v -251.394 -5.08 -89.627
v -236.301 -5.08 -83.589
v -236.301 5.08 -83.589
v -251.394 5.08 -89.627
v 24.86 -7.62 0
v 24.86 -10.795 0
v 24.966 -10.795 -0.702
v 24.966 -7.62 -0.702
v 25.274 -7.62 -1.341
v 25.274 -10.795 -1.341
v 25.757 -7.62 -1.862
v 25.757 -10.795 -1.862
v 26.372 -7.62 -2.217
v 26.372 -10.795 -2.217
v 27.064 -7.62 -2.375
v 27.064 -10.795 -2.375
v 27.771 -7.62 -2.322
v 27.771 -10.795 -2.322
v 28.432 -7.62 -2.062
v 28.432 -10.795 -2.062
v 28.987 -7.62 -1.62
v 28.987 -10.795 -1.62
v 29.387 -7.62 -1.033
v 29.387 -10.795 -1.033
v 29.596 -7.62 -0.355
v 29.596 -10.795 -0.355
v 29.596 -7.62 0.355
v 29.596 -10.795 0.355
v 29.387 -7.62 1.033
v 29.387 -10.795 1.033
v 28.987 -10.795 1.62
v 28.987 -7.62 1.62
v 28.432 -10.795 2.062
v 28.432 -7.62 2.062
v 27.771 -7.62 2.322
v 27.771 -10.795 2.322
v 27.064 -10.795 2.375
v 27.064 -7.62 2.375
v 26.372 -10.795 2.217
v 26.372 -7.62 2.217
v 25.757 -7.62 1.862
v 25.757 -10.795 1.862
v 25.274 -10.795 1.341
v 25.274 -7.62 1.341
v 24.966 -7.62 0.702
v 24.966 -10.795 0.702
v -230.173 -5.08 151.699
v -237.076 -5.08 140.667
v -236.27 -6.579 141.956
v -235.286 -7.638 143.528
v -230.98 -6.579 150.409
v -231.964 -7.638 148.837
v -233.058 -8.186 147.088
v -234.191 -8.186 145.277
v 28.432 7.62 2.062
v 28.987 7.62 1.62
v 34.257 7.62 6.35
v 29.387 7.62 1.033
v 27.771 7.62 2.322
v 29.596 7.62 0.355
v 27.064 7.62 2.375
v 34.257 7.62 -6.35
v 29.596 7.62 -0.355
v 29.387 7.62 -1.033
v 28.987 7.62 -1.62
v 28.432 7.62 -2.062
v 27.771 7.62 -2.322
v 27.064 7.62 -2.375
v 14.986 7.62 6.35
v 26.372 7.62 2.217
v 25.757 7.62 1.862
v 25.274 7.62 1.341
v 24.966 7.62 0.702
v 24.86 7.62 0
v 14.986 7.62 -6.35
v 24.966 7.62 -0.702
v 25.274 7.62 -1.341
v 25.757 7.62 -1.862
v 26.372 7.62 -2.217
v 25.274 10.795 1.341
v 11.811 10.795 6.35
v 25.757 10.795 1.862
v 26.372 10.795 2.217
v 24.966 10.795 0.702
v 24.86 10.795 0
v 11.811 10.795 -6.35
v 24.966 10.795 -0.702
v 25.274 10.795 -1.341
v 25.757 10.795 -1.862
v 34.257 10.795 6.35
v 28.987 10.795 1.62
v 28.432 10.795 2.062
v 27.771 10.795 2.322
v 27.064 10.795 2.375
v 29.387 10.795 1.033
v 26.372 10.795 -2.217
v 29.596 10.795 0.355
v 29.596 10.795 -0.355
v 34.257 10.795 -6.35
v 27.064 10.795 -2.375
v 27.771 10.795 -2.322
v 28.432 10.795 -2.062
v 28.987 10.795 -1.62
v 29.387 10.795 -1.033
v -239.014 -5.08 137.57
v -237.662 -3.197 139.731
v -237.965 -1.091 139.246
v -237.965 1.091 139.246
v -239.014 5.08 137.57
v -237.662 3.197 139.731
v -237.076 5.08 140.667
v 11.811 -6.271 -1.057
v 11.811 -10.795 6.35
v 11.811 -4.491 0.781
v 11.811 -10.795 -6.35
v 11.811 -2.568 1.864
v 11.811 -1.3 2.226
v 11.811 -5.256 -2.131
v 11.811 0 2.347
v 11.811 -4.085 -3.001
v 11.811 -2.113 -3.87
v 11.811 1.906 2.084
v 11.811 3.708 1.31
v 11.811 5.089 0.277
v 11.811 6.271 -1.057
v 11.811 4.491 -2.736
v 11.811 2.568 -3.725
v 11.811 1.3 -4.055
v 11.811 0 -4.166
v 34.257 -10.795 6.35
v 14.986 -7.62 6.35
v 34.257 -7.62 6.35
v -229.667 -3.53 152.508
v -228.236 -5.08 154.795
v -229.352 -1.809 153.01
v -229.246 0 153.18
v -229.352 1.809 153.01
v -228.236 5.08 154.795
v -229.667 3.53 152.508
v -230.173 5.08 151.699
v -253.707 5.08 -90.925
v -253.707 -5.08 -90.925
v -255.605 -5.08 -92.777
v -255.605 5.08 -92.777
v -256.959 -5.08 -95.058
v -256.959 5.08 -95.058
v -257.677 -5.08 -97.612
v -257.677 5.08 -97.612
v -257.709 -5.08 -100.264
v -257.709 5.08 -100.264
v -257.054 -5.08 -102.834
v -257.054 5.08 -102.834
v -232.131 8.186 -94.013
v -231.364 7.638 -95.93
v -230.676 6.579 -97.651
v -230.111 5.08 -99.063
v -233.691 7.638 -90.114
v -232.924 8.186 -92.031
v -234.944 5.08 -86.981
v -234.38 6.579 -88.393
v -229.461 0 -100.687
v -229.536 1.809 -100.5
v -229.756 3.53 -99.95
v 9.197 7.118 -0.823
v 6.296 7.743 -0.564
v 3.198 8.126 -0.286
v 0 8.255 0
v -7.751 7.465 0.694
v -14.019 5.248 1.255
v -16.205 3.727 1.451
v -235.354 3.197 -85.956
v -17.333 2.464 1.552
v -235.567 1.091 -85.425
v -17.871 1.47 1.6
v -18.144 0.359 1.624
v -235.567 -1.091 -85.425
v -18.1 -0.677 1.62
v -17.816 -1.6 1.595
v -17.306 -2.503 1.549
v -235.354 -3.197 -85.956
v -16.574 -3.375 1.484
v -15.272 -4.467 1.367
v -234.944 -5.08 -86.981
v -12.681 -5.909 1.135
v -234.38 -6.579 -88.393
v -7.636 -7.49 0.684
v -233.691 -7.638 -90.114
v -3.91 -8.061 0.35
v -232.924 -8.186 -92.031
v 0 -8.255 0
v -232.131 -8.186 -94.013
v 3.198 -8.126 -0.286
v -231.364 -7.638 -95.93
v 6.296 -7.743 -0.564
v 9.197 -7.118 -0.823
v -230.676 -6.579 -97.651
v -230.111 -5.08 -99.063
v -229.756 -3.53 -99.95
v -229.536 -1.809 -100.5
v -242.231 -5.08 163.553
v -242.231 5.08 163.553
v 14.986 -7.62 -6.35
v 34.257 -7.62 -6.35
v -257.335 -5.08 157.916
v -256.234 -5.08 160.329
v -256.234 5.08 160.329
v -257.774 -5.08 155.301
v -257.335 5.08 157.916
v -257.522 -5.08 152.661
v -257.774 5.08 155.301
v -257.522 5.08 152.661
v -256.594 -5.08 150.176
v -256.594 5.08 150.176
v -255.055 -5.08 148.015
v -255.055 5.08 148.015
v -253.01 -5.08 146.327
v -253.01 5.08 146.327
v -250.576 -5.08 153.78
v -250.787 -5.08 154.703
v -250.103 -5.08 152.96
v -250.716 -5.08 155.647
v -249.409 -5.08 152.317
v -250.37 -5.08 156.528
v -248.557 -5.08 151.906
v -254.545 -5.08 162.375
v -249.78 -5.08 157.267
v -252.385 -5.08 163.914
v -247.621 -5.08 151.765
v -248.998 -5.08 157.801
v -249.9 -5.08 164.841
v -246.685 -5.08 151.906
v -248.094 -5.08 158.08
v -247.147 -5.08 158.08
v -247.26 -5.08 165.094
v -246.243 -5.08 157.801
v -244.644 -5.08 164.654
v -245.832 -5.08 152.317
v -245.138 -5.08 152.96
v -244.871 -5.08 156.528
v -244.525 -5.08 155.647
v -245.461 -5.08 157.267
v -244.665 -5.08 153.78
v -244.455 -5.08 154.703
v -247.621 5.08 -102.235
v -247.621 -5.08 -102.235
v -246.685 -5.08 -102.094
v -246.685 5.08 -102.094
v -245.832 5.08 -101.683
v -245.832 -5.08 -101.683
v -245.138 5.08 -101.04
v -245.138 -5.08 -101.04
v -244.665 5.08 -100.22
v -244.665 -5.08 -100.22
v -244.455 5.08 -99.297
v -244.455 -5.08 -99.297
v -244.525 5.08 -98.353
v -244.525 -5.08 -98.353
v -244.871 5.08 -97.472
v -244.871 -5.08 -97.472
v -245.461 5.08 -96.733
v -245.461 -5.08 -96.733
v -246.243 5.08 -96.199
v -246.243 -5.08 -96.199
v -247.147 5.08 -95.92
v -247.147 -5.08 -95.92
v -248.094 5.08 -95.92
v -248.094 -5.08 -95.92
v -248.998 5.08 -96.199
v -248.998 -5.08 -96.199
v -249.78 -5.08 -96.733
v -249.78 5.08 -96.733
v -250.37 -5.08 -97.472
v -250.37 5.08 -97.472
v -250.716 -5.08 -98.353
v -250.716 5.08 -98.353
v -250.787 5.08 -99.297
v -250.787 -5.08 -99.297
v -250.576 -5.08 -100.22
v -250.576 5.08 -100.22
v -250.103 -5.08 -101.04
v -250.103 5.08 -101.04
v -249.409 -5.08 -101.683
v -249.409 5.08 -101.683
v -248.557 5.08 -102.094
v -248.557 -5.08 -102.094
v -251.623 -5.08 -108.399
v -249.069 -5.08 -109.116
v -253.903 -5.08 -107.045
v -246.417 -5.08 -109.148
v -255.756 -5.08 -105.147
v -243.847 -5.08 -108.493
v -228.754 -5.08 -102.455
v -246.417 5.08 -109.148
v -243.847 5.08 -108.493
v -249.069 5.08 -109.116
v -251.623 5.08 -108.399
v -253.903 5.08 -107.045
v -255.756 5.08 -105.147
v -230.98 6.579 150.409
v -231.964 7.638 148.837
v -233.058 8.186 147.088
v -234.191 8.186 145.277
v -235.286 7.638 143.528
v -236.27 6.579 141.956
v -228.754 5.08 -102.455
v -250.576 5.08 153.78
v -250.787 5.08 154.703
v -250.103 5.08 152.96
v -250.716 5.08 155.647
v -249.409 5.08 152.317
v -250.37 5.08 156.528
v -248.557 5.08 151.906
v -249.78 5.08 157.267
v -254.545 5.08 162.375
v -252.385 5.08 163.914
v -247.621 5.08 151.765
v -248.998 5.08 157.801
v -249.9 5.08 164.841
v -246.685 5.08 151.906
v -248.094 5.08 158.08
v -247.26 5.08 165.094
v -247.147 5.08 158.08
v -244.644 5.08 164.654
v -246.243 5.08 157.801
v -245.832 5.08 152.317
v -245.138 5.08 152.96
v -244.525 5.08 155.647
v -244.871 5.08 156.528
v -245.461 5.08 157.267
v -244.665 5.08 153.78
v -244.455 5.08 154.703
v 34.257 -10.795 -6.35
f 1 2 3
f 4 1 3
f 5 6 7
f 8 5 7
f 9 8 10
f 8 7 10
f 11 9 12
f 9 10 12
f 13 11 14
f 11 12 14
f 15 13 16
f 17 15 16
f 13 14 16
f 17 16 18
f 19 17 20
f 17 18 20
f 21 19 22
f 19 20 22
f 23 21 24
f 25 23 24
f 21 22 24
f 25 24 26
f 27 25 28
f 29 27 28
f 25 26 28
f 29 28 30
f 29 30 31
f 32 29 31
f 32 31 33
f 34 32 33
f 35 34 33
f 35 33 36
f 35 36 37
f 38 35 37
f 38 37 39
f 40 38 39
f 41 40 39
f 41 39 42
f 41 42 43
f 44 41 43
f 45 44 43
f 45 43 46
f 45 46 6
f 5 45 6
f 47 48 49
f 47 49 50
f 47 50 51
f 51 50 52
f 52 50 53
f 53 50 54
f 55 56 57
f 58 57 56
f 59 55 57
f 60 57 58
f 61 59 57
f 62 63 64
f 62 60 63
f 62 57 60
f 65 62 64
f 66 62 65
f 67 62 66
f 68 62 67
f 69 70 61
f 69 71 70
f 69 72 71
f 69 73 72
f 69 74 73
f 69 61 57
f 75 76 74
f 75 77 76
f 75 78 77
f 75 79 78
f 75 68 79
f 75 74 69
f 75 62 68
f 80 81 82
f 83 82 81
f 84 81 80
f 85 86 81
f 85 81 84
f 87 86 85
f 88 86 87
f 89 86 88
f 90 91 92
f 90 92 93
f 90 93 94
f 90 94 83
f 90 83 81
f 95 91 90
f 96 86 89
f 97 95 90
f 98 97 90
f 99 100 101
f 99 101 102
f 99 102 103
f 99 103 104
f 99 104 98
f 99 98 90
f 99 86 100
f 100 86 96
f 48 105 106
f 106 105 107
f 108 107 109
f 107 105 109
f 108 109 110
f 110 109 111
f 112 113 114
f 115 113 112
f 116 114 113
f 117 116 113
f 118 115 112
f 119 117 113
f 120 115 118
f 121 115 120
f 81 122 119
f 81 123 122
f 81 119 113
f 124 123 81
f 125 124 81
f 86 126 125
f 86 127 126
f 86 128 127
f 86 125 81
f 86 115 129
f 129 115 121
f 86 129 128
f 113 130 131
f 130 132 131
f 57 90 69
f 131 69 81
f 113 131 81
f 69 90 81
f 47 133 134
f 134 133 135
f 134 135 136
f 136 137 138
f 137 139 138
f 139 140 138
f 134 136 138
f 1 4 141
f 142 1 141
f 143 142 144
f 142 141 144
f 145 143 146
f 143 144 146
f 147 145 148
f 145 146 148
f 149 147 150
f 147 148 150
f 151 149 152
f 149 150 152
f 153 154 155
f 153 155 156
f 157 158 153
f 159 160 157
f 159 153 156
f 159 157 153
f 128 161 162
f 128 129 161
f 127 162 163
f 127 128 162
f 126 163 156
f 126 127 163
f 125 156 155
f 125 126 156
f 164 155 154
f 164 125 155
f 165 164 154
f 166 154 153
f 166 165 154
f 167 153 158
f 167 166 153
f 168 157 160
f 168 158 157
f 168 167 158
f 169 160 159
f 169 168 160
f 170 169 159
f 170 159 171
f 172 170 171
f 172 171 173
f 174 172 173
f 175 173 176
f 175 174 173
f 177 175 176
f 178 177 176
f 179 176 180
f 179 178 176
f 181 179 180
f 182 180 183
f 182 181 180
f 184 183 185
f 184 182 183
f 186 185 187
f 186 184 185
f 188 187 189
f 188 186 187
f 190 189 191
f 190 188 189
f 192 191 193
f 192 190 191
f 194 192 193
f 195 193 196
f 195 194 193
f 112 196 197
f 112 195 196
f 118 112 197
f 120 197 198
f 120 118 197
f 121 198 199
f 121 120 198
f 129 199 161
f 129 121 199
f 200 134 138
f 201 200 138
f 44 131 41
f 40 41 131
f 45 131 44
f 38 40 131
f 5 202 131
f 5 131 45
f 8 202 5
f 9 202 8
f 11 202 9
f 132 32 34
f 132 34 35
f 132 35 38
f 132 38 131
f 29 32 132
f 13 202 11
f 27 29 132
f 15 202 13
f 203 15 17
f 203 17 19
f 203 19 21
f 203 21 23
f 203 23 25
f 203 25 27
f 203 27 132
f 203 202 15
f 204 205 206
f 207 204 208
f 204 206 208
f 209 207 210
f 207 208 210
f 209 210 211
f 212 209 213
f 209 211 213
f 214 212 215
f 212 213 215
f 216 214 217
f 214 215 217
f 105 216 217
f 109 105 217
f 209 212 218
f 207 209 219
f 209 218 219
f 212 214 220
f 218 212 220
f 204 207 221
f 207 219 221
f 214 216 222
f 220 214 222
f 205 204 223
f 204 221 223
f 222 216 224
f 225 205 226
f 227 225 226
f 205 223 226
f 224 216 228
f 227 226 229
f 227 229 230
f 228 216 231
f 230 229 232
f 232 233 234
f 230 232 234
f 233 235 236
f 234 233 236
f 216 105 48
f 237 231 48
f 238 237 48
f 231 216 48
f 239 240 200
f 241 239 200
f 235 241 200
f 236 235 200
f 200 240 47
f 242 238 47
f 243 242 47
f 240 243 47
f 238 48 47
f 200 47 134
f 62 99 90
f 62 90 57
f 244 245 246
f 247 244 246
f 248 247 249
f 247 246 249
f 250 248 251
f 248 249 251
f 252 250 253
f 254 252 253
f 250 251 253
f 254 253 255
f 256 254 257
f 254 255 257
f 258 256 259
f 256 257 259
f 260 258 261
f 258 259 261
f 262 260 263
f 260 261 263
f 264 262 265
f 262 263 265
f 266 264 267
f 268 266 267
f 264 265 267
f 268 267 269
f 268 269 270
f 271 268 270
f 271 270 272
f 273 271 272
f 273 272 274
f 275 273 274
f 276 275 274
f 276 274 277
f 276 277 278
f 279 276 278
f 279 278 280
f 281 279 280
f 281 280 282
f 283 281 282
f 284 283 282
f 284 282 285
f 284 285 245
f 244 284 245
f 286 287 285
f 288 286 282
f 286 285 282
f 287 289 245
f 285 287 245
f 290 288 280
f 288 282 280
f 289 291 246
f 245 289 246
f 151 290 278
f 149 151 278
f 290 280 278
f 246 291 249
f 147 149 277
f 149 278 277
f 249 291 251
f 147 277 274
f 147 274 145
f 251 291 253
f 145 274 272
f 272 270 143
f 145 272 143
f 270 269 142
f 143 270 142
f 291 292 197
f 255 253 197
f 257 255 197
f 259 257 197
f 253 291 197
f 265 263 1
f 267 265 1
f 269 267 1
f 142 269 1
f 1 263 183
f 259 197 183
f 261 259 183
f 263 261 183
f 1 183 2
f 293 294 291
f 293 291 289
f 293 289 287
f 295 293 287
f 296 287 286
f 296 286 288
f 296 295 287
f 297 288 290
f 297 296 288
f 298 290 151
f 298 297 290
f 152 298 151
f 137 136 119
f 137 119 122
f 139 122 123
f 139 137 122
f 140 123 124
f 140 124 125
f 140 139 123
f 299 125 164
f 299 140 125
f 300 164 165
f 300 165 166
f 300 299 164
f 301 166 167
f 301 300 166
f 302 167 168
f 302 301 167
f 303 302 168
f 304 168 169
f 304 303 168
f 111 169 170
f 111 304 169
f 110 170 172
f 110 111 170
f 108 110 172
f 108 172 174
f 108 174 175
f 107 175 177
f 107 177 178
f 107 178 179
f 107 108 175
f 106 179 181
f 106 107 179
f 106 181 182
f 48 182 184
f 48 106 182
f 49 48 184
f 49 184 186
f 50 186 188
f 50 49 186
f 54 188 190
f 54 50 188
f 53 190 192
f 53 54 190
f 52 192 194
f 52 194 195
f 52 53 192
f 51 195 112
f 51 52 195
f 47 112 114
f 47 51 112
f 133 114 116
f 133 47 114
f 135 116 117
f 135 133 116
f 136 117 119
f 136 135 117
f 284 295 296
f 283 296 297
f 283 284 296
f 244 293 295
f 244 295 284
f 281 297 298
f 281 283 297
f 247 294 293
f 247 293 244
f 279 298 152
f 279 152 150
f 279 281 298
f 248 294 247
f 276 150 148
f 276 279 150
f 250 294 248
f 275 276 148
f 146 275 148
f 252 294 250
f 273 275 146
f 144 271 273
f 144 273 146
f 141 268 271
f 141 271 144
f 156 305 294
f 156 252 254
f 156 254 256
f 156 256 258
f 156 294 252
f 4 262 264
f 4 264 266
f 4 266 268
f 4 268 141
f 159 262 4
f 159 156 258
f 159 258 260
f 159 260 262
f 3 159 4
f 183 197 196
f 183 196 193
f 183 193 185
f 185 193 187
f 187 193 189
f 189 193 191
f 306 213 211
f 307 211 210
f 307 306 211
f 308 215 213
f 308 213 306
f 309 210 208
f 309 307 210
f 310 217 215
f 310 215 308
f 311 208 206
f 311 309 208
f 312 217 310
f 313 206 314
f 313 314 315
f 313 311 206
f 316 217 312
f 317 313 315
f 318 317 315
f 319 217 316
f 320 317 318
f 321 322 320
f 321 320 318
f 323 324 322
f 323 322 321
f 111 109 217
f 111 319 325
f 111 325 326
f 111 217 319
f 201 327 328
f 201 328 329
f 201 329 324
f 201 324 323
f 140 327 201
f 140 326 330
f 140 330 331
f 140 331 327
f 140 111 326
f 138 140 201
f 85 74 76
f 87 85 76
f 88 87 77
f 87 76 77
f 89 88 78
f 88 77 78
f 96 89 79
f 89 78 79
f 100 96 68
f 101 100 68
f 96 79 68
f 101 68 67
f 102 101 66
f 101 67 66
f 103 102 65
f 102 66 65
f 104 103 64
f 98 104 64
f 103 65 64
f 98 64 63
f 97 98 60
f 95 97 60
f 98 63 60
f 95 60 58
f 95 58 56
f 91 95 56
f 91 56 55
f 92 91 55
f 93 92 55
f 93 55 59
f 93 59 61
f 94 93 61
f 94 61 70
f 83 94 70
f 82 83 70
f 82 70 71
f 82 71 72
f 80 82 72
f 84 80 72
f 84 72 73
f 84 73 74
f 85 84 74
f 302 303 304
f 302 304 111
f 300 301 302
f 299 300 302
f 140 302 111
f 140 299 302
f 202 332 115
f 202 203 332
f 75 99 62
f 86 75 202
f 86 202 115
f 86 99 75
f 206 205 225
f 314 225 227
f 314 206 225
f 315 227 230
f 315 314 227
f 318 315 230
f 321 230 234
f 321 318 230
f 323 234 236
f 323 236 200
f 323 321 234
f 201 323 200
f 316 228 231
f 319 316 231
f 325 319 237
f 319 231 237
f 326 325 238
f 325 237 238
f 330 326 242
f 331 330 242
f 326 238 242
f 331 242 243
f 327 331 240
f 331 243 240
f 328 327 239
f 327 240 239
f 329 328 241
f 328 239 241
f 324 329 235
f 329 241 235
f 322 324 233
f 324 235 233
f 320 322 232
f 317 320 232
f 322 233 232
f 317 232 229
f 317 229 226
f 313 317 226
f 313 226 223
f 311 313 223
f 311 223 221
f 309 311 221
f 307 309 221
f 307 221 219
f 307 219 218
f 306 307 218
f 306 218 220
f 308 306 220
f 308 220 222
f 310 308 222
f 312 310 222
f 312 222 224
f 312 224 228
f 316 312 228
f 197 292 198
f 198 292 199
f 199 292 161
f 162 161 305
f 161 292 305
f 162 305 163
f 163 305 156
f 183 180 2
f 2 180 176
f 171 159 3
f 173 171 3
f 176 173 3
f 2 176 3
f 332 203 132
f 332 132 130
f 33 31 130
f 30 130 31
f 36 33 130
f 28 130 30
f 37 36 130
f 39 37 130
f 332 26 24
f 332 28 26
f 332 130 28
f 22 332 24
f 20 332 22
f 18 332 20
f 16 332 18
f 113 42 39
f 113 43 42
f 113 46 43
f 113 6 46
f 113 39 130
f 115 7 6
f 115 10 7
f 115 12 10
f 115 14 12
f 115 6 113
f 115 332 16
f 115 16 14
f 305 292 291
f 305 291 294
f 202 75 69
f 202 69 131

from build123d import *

# Parameters (mm, degrees)
SKETCH2_R                      = 8.255
BOSS_EXTRUDE1_DEPTH            = 6.35
BOSS_EXTRUDE1_DEPTH_BACK       = 6.35
BOSS_EXTRUDE2_DEPTH            = 10.16
BOSS_EXTRUDE2_DEPTH_BACK       = 16.51
SKETCH4_W                      = 20.32
SKETCH4_H                      = 10.16
BOSS_EXTRUDE3_DEPTH            = 10.16
BOSS_EXTRUDE3_DEPTH_BACK       = 16.256
SKETCH5_W                      = 20.32
SKETCH5_H                      = 10.16
CUT_EXTRUDE1_DEPTH             = 312.833197041
CUT_EXTRUDE2_DEPTH             = 312.833197041
CUT_EXTRUDE3_DEPTH             = 16.51
CUT_EXTRUDE4_START             = -16.256
CUT_EXTRUDE4_DEPTH             = 16.256
CUT_EXTRUDE5_DEPTH             = 303.933951477
E_0_25_DIAMETER_HOLE1_D        = 6.35
E_0_25_DIAMETER_HOLE1_DEPTH    = 19.05
E_0_25_DIAMETER_HOLE1_TIP      = 1.907732465
F_3_16_0_1875_DIAMETER_HOLE1_D = 4.7625


with BuildPart() as part:
    # Sweep1: sweep along a path in Sketch1
    with BuildLine(Plane(origin=(0, 0, 0), x_dir=(1, 0, 0), z_dir=(0, 1, 0))) as sweep1_path:
        Line((-247.620690573, 99.06), (0, 0))
        Line((0, 0), (-247.620690573, -154.94))
    # Sketch2 → Sweep1 (sweep)
    with BuildSketch(Plane(origin=(-247.620690573, 0, 154.94), x_dir=(0.5304347826086957, 0, 0.847725746570709), z_dir=(-0.8477257465707089, 0, 0.5304347826086956))):
        Circle(SKETCH2_R)
    sweep(path=sweep1_path.line, transition=Transition.RIGHT)

    # Sketch3 → Boss-Extrude1 (add, two sides: drawn at the far end of the back side and taken through both)
    with BuildSketch(Plane.XY.offset(-BOSS_EXTRUDE1_DEPTH_BACK)):
        Polygon((34.256672931, -10.795), (11.811, -10.795), (11.811, 10.795), (34.256672931, 10.795), (34.256672931, 7.62), (14.986, 7.62), (14.986, -7.62), (34.256672931, -7.62), align=None)
    extrude(amount=BOSS_EXTRUDE1_DEPTH + BOSS_EXTRUDE1_DEPTH_BACK)

    # Sketch4 → Boss-Extrude2 (add, two sides: drawn at the far end of the back side and taken through both)
    with BuildSketch(Plane(origin=(-247.620690573, 0, 154.94), x_dir=(0.5304347826086958, 0, 0.8477257465707089), z_dir=(-0.847725746570709, 0, 0.5304347826086958)).offset(-BOSS_EXTRUDE2_DEPTH_BACK)):
        Rectangle(SKETCH4_W, SKETCH4_H)
    extrude(amount=BOSS_EXTRUDE2_DEPTH + BOSS_EXTRUDE2_DEPTH_BACK)

    # Sketch5 → Boss-Extrude3 (add, two sides: drawn at the far end of the back side and taken through both)
    with BuildSketch(Plane(origin=(-247.620690573, 0, -99.06), x_dir=(-0.3714285714285716, 0, 0.9284615319583954), z_dir=(-0.9284615319583954, 0, -0.3714285714285716)).offset(-BOSS_EXTRUDE3_DEPTH_BACK)):
        Rectangle(SKETCH5_W, SKETCH5_H)
    extrude(amount=BOSS_EXTRUDE3_DEPTH + BOSS_EXTRUDE3_DEPTH_BACK)

    # Sketch7 → Cut-Extrude1 (cut, through all)
    with BuildSketch(Plane(origin=(0, 5.08, 0), x_dir=(1, 0, 0), z_dir=(0, 1, 0))):
        with BuildLine():
            Line((-257.053859738, 102.833714286), (-260.827574024, 93.400545121))
            Line((-260.827574024, 93.400545121), (-251.394404859, 89.626830835))
            ThreePointArc((-251.394404859, 89.626830835), (-256.959367419, 95.058161077), (-257.053859738, 102.833714286))
        make_face()
    cut_extrude1 = extrude(amount=-CUT_EXTRUDE1_DEPTH, mode=Mode.SUBTRACT)

    # Mirror1: Cut-Extrude1 across plane
    add(cut_extrude1.mirror(Plane(origin=(0, 0, 0), x_dir=(0.9284615319583953, 0, 0.3714285714285718), z_dir=(-0.3714285714285718, 0, 0.9284615319583954))), mode=Mode.SUBTRACT)

    # Sketch9 → Cut-Extrude2 (cut, through all)
    with BuildSketch(Plane(origin=(0, 5.08, 0), x_dir=(1, 0, 0), z_dir=(0, 1, 0))):
        with BuildLine():
            Line((-242.231473182, -163.552893585), (-250.844366767, -168.942110976))
            Line((-250.844366767, -168.942110976), (-256.233584158, -160.329217391))
            ThreePointArc((-256.233584158, -160.329217391), (-249.90017387, -164.840987622), (-242.231473182, -163.552893585))
        make_face()
    cut_extrude2 = extrude(amount=-CUT_EXTRUDE2_DEPTH, mode=Mode.SUBTRACT)

    # Mirror2: Cut-Extrude2 across plane
    add(cut_extrude2.mirror(Plane(origin=(0, 0, 0), x_dir=(-0.8477257465707089, 0, 0.5304347826086955), z_dir=(0.5304347826086959, 0, 0.8477257465707089))), mode=Mode.SUBTRACT)

    # Sketch10 → Cut-Extrude3 (cut)
    with BuildSketch(Plane(origin=(-247.620690573, 0, 154.94), x_dir=(0.5304347826086958, 0, 0.8477257465707089), z_dir=(-0.847725746570709, 0, 0.5304347826086958))):
        with BuildLine():
            Line((6.506813736, -5.08), (-6.506813736, -5.08))
            ThreePointArc((-6.506813736, -5.08), (0, -8.255), (6.506813736, -5.08))
        make_face()
        with BuildLine():
            Line((-6.506813736, 5.08), (6.506813736, 5.08))
            ThreePointArc((6.506813736, 5.08), (0, 8.255), (-6.506813736, 5.08))
        make_face()
    extrude(amount=-CUT_EXTRUDE3_DEPTH, mode=Mode.SUBTRACT)

    # Sketch11 → Cut-Extrude4 (cut)
    with BuildSketch(Plane(origin=(-247.620690573, 0, -99.06), x_dir=(-0.3714285714285716, 0, 0.9284615319583954), z_dir=(-0.9284615319583954, 0, -0.3714285714285716)).offset(CUT_EXTRUDE4_START)):
        with BuildLine():
            Line((6.506813736, -5.08), (-6.506813736, -5.08))
            ThreePointArc((-6.506813736, -5.08), (0, -8.255), (6.506813736, -5.08))
        make_face()
        with BuildLine():
            Line((-6.506813736, 5.08), (6.506813736, 5.08))
            ThreePointArc((6.506813736, 5.08), (0, 8.255), (-6.506813736, 5.08))
        make_face()
    extrude(amount=CUT_EXTRUDE4_DEPTH, mode=Mode.SUBTRACT)

    # Sketch12 → Cut-Extrude5 (cut, through all)
    with BuildSketch(Plane.XY.offset(6.35)):
        with BuildLine():
            Line((14.986, 4.663063163), (14.986, -4.663063163))
            add(Edge.make_bspline(
                [(14.986, -4.663063163), (22.008669492, 0), (14.986, 4.663063163)],
                knots=[5.682900603, 5.682900603, 5.682900603, 6.883470012, 6.883470012, 6.883470012], degree=2, weights=[1, 0.825174825, 1]))
        make_face()
    extrude(amount=-CUT_EXTRUDE5_DEPTH, mode=Mode.SUBTRACT)

    # E (0.25) Diameter Hole1
    with Locations(Plane(origin=(-247.620690573, 5.08, -99.06), x_dir=(0, 0, 1), z_dir=(0, 1, 0))):
        with Locations((0, 0), (254, 0)):
            Hole(E_0_25_DIAMETER_HOLE1_D / 2, depth=E_0_25_DIAMETER_HOLE1_DEPTH)
            with Locations((0, 0, -(E_0_25_DIAMETER_HOLE1_DEPTH + E_0_25_DIAMETER_HOLE1_TIP / 2))):  # 118° drill point
                Cone(0, E_0_25_DIAMETER_HOLE1_D / 2, E_0_25_DIAMETER_HOLE1_TIP, mode=Mode.SUBTRACT)

    # 3/16 (0.1875) Diameter Hole1 (through all)
    with Locations(Plane(origin=(0, 10.795, 0), x_dir=(1, 0, 0), z_dir=(0, 1, 0))):
        with Locations((27.241523324, 0)):
            Hole(F_3_16_0_1875_DIAMETER_HOLE1_D / 2)


solid = part.part
